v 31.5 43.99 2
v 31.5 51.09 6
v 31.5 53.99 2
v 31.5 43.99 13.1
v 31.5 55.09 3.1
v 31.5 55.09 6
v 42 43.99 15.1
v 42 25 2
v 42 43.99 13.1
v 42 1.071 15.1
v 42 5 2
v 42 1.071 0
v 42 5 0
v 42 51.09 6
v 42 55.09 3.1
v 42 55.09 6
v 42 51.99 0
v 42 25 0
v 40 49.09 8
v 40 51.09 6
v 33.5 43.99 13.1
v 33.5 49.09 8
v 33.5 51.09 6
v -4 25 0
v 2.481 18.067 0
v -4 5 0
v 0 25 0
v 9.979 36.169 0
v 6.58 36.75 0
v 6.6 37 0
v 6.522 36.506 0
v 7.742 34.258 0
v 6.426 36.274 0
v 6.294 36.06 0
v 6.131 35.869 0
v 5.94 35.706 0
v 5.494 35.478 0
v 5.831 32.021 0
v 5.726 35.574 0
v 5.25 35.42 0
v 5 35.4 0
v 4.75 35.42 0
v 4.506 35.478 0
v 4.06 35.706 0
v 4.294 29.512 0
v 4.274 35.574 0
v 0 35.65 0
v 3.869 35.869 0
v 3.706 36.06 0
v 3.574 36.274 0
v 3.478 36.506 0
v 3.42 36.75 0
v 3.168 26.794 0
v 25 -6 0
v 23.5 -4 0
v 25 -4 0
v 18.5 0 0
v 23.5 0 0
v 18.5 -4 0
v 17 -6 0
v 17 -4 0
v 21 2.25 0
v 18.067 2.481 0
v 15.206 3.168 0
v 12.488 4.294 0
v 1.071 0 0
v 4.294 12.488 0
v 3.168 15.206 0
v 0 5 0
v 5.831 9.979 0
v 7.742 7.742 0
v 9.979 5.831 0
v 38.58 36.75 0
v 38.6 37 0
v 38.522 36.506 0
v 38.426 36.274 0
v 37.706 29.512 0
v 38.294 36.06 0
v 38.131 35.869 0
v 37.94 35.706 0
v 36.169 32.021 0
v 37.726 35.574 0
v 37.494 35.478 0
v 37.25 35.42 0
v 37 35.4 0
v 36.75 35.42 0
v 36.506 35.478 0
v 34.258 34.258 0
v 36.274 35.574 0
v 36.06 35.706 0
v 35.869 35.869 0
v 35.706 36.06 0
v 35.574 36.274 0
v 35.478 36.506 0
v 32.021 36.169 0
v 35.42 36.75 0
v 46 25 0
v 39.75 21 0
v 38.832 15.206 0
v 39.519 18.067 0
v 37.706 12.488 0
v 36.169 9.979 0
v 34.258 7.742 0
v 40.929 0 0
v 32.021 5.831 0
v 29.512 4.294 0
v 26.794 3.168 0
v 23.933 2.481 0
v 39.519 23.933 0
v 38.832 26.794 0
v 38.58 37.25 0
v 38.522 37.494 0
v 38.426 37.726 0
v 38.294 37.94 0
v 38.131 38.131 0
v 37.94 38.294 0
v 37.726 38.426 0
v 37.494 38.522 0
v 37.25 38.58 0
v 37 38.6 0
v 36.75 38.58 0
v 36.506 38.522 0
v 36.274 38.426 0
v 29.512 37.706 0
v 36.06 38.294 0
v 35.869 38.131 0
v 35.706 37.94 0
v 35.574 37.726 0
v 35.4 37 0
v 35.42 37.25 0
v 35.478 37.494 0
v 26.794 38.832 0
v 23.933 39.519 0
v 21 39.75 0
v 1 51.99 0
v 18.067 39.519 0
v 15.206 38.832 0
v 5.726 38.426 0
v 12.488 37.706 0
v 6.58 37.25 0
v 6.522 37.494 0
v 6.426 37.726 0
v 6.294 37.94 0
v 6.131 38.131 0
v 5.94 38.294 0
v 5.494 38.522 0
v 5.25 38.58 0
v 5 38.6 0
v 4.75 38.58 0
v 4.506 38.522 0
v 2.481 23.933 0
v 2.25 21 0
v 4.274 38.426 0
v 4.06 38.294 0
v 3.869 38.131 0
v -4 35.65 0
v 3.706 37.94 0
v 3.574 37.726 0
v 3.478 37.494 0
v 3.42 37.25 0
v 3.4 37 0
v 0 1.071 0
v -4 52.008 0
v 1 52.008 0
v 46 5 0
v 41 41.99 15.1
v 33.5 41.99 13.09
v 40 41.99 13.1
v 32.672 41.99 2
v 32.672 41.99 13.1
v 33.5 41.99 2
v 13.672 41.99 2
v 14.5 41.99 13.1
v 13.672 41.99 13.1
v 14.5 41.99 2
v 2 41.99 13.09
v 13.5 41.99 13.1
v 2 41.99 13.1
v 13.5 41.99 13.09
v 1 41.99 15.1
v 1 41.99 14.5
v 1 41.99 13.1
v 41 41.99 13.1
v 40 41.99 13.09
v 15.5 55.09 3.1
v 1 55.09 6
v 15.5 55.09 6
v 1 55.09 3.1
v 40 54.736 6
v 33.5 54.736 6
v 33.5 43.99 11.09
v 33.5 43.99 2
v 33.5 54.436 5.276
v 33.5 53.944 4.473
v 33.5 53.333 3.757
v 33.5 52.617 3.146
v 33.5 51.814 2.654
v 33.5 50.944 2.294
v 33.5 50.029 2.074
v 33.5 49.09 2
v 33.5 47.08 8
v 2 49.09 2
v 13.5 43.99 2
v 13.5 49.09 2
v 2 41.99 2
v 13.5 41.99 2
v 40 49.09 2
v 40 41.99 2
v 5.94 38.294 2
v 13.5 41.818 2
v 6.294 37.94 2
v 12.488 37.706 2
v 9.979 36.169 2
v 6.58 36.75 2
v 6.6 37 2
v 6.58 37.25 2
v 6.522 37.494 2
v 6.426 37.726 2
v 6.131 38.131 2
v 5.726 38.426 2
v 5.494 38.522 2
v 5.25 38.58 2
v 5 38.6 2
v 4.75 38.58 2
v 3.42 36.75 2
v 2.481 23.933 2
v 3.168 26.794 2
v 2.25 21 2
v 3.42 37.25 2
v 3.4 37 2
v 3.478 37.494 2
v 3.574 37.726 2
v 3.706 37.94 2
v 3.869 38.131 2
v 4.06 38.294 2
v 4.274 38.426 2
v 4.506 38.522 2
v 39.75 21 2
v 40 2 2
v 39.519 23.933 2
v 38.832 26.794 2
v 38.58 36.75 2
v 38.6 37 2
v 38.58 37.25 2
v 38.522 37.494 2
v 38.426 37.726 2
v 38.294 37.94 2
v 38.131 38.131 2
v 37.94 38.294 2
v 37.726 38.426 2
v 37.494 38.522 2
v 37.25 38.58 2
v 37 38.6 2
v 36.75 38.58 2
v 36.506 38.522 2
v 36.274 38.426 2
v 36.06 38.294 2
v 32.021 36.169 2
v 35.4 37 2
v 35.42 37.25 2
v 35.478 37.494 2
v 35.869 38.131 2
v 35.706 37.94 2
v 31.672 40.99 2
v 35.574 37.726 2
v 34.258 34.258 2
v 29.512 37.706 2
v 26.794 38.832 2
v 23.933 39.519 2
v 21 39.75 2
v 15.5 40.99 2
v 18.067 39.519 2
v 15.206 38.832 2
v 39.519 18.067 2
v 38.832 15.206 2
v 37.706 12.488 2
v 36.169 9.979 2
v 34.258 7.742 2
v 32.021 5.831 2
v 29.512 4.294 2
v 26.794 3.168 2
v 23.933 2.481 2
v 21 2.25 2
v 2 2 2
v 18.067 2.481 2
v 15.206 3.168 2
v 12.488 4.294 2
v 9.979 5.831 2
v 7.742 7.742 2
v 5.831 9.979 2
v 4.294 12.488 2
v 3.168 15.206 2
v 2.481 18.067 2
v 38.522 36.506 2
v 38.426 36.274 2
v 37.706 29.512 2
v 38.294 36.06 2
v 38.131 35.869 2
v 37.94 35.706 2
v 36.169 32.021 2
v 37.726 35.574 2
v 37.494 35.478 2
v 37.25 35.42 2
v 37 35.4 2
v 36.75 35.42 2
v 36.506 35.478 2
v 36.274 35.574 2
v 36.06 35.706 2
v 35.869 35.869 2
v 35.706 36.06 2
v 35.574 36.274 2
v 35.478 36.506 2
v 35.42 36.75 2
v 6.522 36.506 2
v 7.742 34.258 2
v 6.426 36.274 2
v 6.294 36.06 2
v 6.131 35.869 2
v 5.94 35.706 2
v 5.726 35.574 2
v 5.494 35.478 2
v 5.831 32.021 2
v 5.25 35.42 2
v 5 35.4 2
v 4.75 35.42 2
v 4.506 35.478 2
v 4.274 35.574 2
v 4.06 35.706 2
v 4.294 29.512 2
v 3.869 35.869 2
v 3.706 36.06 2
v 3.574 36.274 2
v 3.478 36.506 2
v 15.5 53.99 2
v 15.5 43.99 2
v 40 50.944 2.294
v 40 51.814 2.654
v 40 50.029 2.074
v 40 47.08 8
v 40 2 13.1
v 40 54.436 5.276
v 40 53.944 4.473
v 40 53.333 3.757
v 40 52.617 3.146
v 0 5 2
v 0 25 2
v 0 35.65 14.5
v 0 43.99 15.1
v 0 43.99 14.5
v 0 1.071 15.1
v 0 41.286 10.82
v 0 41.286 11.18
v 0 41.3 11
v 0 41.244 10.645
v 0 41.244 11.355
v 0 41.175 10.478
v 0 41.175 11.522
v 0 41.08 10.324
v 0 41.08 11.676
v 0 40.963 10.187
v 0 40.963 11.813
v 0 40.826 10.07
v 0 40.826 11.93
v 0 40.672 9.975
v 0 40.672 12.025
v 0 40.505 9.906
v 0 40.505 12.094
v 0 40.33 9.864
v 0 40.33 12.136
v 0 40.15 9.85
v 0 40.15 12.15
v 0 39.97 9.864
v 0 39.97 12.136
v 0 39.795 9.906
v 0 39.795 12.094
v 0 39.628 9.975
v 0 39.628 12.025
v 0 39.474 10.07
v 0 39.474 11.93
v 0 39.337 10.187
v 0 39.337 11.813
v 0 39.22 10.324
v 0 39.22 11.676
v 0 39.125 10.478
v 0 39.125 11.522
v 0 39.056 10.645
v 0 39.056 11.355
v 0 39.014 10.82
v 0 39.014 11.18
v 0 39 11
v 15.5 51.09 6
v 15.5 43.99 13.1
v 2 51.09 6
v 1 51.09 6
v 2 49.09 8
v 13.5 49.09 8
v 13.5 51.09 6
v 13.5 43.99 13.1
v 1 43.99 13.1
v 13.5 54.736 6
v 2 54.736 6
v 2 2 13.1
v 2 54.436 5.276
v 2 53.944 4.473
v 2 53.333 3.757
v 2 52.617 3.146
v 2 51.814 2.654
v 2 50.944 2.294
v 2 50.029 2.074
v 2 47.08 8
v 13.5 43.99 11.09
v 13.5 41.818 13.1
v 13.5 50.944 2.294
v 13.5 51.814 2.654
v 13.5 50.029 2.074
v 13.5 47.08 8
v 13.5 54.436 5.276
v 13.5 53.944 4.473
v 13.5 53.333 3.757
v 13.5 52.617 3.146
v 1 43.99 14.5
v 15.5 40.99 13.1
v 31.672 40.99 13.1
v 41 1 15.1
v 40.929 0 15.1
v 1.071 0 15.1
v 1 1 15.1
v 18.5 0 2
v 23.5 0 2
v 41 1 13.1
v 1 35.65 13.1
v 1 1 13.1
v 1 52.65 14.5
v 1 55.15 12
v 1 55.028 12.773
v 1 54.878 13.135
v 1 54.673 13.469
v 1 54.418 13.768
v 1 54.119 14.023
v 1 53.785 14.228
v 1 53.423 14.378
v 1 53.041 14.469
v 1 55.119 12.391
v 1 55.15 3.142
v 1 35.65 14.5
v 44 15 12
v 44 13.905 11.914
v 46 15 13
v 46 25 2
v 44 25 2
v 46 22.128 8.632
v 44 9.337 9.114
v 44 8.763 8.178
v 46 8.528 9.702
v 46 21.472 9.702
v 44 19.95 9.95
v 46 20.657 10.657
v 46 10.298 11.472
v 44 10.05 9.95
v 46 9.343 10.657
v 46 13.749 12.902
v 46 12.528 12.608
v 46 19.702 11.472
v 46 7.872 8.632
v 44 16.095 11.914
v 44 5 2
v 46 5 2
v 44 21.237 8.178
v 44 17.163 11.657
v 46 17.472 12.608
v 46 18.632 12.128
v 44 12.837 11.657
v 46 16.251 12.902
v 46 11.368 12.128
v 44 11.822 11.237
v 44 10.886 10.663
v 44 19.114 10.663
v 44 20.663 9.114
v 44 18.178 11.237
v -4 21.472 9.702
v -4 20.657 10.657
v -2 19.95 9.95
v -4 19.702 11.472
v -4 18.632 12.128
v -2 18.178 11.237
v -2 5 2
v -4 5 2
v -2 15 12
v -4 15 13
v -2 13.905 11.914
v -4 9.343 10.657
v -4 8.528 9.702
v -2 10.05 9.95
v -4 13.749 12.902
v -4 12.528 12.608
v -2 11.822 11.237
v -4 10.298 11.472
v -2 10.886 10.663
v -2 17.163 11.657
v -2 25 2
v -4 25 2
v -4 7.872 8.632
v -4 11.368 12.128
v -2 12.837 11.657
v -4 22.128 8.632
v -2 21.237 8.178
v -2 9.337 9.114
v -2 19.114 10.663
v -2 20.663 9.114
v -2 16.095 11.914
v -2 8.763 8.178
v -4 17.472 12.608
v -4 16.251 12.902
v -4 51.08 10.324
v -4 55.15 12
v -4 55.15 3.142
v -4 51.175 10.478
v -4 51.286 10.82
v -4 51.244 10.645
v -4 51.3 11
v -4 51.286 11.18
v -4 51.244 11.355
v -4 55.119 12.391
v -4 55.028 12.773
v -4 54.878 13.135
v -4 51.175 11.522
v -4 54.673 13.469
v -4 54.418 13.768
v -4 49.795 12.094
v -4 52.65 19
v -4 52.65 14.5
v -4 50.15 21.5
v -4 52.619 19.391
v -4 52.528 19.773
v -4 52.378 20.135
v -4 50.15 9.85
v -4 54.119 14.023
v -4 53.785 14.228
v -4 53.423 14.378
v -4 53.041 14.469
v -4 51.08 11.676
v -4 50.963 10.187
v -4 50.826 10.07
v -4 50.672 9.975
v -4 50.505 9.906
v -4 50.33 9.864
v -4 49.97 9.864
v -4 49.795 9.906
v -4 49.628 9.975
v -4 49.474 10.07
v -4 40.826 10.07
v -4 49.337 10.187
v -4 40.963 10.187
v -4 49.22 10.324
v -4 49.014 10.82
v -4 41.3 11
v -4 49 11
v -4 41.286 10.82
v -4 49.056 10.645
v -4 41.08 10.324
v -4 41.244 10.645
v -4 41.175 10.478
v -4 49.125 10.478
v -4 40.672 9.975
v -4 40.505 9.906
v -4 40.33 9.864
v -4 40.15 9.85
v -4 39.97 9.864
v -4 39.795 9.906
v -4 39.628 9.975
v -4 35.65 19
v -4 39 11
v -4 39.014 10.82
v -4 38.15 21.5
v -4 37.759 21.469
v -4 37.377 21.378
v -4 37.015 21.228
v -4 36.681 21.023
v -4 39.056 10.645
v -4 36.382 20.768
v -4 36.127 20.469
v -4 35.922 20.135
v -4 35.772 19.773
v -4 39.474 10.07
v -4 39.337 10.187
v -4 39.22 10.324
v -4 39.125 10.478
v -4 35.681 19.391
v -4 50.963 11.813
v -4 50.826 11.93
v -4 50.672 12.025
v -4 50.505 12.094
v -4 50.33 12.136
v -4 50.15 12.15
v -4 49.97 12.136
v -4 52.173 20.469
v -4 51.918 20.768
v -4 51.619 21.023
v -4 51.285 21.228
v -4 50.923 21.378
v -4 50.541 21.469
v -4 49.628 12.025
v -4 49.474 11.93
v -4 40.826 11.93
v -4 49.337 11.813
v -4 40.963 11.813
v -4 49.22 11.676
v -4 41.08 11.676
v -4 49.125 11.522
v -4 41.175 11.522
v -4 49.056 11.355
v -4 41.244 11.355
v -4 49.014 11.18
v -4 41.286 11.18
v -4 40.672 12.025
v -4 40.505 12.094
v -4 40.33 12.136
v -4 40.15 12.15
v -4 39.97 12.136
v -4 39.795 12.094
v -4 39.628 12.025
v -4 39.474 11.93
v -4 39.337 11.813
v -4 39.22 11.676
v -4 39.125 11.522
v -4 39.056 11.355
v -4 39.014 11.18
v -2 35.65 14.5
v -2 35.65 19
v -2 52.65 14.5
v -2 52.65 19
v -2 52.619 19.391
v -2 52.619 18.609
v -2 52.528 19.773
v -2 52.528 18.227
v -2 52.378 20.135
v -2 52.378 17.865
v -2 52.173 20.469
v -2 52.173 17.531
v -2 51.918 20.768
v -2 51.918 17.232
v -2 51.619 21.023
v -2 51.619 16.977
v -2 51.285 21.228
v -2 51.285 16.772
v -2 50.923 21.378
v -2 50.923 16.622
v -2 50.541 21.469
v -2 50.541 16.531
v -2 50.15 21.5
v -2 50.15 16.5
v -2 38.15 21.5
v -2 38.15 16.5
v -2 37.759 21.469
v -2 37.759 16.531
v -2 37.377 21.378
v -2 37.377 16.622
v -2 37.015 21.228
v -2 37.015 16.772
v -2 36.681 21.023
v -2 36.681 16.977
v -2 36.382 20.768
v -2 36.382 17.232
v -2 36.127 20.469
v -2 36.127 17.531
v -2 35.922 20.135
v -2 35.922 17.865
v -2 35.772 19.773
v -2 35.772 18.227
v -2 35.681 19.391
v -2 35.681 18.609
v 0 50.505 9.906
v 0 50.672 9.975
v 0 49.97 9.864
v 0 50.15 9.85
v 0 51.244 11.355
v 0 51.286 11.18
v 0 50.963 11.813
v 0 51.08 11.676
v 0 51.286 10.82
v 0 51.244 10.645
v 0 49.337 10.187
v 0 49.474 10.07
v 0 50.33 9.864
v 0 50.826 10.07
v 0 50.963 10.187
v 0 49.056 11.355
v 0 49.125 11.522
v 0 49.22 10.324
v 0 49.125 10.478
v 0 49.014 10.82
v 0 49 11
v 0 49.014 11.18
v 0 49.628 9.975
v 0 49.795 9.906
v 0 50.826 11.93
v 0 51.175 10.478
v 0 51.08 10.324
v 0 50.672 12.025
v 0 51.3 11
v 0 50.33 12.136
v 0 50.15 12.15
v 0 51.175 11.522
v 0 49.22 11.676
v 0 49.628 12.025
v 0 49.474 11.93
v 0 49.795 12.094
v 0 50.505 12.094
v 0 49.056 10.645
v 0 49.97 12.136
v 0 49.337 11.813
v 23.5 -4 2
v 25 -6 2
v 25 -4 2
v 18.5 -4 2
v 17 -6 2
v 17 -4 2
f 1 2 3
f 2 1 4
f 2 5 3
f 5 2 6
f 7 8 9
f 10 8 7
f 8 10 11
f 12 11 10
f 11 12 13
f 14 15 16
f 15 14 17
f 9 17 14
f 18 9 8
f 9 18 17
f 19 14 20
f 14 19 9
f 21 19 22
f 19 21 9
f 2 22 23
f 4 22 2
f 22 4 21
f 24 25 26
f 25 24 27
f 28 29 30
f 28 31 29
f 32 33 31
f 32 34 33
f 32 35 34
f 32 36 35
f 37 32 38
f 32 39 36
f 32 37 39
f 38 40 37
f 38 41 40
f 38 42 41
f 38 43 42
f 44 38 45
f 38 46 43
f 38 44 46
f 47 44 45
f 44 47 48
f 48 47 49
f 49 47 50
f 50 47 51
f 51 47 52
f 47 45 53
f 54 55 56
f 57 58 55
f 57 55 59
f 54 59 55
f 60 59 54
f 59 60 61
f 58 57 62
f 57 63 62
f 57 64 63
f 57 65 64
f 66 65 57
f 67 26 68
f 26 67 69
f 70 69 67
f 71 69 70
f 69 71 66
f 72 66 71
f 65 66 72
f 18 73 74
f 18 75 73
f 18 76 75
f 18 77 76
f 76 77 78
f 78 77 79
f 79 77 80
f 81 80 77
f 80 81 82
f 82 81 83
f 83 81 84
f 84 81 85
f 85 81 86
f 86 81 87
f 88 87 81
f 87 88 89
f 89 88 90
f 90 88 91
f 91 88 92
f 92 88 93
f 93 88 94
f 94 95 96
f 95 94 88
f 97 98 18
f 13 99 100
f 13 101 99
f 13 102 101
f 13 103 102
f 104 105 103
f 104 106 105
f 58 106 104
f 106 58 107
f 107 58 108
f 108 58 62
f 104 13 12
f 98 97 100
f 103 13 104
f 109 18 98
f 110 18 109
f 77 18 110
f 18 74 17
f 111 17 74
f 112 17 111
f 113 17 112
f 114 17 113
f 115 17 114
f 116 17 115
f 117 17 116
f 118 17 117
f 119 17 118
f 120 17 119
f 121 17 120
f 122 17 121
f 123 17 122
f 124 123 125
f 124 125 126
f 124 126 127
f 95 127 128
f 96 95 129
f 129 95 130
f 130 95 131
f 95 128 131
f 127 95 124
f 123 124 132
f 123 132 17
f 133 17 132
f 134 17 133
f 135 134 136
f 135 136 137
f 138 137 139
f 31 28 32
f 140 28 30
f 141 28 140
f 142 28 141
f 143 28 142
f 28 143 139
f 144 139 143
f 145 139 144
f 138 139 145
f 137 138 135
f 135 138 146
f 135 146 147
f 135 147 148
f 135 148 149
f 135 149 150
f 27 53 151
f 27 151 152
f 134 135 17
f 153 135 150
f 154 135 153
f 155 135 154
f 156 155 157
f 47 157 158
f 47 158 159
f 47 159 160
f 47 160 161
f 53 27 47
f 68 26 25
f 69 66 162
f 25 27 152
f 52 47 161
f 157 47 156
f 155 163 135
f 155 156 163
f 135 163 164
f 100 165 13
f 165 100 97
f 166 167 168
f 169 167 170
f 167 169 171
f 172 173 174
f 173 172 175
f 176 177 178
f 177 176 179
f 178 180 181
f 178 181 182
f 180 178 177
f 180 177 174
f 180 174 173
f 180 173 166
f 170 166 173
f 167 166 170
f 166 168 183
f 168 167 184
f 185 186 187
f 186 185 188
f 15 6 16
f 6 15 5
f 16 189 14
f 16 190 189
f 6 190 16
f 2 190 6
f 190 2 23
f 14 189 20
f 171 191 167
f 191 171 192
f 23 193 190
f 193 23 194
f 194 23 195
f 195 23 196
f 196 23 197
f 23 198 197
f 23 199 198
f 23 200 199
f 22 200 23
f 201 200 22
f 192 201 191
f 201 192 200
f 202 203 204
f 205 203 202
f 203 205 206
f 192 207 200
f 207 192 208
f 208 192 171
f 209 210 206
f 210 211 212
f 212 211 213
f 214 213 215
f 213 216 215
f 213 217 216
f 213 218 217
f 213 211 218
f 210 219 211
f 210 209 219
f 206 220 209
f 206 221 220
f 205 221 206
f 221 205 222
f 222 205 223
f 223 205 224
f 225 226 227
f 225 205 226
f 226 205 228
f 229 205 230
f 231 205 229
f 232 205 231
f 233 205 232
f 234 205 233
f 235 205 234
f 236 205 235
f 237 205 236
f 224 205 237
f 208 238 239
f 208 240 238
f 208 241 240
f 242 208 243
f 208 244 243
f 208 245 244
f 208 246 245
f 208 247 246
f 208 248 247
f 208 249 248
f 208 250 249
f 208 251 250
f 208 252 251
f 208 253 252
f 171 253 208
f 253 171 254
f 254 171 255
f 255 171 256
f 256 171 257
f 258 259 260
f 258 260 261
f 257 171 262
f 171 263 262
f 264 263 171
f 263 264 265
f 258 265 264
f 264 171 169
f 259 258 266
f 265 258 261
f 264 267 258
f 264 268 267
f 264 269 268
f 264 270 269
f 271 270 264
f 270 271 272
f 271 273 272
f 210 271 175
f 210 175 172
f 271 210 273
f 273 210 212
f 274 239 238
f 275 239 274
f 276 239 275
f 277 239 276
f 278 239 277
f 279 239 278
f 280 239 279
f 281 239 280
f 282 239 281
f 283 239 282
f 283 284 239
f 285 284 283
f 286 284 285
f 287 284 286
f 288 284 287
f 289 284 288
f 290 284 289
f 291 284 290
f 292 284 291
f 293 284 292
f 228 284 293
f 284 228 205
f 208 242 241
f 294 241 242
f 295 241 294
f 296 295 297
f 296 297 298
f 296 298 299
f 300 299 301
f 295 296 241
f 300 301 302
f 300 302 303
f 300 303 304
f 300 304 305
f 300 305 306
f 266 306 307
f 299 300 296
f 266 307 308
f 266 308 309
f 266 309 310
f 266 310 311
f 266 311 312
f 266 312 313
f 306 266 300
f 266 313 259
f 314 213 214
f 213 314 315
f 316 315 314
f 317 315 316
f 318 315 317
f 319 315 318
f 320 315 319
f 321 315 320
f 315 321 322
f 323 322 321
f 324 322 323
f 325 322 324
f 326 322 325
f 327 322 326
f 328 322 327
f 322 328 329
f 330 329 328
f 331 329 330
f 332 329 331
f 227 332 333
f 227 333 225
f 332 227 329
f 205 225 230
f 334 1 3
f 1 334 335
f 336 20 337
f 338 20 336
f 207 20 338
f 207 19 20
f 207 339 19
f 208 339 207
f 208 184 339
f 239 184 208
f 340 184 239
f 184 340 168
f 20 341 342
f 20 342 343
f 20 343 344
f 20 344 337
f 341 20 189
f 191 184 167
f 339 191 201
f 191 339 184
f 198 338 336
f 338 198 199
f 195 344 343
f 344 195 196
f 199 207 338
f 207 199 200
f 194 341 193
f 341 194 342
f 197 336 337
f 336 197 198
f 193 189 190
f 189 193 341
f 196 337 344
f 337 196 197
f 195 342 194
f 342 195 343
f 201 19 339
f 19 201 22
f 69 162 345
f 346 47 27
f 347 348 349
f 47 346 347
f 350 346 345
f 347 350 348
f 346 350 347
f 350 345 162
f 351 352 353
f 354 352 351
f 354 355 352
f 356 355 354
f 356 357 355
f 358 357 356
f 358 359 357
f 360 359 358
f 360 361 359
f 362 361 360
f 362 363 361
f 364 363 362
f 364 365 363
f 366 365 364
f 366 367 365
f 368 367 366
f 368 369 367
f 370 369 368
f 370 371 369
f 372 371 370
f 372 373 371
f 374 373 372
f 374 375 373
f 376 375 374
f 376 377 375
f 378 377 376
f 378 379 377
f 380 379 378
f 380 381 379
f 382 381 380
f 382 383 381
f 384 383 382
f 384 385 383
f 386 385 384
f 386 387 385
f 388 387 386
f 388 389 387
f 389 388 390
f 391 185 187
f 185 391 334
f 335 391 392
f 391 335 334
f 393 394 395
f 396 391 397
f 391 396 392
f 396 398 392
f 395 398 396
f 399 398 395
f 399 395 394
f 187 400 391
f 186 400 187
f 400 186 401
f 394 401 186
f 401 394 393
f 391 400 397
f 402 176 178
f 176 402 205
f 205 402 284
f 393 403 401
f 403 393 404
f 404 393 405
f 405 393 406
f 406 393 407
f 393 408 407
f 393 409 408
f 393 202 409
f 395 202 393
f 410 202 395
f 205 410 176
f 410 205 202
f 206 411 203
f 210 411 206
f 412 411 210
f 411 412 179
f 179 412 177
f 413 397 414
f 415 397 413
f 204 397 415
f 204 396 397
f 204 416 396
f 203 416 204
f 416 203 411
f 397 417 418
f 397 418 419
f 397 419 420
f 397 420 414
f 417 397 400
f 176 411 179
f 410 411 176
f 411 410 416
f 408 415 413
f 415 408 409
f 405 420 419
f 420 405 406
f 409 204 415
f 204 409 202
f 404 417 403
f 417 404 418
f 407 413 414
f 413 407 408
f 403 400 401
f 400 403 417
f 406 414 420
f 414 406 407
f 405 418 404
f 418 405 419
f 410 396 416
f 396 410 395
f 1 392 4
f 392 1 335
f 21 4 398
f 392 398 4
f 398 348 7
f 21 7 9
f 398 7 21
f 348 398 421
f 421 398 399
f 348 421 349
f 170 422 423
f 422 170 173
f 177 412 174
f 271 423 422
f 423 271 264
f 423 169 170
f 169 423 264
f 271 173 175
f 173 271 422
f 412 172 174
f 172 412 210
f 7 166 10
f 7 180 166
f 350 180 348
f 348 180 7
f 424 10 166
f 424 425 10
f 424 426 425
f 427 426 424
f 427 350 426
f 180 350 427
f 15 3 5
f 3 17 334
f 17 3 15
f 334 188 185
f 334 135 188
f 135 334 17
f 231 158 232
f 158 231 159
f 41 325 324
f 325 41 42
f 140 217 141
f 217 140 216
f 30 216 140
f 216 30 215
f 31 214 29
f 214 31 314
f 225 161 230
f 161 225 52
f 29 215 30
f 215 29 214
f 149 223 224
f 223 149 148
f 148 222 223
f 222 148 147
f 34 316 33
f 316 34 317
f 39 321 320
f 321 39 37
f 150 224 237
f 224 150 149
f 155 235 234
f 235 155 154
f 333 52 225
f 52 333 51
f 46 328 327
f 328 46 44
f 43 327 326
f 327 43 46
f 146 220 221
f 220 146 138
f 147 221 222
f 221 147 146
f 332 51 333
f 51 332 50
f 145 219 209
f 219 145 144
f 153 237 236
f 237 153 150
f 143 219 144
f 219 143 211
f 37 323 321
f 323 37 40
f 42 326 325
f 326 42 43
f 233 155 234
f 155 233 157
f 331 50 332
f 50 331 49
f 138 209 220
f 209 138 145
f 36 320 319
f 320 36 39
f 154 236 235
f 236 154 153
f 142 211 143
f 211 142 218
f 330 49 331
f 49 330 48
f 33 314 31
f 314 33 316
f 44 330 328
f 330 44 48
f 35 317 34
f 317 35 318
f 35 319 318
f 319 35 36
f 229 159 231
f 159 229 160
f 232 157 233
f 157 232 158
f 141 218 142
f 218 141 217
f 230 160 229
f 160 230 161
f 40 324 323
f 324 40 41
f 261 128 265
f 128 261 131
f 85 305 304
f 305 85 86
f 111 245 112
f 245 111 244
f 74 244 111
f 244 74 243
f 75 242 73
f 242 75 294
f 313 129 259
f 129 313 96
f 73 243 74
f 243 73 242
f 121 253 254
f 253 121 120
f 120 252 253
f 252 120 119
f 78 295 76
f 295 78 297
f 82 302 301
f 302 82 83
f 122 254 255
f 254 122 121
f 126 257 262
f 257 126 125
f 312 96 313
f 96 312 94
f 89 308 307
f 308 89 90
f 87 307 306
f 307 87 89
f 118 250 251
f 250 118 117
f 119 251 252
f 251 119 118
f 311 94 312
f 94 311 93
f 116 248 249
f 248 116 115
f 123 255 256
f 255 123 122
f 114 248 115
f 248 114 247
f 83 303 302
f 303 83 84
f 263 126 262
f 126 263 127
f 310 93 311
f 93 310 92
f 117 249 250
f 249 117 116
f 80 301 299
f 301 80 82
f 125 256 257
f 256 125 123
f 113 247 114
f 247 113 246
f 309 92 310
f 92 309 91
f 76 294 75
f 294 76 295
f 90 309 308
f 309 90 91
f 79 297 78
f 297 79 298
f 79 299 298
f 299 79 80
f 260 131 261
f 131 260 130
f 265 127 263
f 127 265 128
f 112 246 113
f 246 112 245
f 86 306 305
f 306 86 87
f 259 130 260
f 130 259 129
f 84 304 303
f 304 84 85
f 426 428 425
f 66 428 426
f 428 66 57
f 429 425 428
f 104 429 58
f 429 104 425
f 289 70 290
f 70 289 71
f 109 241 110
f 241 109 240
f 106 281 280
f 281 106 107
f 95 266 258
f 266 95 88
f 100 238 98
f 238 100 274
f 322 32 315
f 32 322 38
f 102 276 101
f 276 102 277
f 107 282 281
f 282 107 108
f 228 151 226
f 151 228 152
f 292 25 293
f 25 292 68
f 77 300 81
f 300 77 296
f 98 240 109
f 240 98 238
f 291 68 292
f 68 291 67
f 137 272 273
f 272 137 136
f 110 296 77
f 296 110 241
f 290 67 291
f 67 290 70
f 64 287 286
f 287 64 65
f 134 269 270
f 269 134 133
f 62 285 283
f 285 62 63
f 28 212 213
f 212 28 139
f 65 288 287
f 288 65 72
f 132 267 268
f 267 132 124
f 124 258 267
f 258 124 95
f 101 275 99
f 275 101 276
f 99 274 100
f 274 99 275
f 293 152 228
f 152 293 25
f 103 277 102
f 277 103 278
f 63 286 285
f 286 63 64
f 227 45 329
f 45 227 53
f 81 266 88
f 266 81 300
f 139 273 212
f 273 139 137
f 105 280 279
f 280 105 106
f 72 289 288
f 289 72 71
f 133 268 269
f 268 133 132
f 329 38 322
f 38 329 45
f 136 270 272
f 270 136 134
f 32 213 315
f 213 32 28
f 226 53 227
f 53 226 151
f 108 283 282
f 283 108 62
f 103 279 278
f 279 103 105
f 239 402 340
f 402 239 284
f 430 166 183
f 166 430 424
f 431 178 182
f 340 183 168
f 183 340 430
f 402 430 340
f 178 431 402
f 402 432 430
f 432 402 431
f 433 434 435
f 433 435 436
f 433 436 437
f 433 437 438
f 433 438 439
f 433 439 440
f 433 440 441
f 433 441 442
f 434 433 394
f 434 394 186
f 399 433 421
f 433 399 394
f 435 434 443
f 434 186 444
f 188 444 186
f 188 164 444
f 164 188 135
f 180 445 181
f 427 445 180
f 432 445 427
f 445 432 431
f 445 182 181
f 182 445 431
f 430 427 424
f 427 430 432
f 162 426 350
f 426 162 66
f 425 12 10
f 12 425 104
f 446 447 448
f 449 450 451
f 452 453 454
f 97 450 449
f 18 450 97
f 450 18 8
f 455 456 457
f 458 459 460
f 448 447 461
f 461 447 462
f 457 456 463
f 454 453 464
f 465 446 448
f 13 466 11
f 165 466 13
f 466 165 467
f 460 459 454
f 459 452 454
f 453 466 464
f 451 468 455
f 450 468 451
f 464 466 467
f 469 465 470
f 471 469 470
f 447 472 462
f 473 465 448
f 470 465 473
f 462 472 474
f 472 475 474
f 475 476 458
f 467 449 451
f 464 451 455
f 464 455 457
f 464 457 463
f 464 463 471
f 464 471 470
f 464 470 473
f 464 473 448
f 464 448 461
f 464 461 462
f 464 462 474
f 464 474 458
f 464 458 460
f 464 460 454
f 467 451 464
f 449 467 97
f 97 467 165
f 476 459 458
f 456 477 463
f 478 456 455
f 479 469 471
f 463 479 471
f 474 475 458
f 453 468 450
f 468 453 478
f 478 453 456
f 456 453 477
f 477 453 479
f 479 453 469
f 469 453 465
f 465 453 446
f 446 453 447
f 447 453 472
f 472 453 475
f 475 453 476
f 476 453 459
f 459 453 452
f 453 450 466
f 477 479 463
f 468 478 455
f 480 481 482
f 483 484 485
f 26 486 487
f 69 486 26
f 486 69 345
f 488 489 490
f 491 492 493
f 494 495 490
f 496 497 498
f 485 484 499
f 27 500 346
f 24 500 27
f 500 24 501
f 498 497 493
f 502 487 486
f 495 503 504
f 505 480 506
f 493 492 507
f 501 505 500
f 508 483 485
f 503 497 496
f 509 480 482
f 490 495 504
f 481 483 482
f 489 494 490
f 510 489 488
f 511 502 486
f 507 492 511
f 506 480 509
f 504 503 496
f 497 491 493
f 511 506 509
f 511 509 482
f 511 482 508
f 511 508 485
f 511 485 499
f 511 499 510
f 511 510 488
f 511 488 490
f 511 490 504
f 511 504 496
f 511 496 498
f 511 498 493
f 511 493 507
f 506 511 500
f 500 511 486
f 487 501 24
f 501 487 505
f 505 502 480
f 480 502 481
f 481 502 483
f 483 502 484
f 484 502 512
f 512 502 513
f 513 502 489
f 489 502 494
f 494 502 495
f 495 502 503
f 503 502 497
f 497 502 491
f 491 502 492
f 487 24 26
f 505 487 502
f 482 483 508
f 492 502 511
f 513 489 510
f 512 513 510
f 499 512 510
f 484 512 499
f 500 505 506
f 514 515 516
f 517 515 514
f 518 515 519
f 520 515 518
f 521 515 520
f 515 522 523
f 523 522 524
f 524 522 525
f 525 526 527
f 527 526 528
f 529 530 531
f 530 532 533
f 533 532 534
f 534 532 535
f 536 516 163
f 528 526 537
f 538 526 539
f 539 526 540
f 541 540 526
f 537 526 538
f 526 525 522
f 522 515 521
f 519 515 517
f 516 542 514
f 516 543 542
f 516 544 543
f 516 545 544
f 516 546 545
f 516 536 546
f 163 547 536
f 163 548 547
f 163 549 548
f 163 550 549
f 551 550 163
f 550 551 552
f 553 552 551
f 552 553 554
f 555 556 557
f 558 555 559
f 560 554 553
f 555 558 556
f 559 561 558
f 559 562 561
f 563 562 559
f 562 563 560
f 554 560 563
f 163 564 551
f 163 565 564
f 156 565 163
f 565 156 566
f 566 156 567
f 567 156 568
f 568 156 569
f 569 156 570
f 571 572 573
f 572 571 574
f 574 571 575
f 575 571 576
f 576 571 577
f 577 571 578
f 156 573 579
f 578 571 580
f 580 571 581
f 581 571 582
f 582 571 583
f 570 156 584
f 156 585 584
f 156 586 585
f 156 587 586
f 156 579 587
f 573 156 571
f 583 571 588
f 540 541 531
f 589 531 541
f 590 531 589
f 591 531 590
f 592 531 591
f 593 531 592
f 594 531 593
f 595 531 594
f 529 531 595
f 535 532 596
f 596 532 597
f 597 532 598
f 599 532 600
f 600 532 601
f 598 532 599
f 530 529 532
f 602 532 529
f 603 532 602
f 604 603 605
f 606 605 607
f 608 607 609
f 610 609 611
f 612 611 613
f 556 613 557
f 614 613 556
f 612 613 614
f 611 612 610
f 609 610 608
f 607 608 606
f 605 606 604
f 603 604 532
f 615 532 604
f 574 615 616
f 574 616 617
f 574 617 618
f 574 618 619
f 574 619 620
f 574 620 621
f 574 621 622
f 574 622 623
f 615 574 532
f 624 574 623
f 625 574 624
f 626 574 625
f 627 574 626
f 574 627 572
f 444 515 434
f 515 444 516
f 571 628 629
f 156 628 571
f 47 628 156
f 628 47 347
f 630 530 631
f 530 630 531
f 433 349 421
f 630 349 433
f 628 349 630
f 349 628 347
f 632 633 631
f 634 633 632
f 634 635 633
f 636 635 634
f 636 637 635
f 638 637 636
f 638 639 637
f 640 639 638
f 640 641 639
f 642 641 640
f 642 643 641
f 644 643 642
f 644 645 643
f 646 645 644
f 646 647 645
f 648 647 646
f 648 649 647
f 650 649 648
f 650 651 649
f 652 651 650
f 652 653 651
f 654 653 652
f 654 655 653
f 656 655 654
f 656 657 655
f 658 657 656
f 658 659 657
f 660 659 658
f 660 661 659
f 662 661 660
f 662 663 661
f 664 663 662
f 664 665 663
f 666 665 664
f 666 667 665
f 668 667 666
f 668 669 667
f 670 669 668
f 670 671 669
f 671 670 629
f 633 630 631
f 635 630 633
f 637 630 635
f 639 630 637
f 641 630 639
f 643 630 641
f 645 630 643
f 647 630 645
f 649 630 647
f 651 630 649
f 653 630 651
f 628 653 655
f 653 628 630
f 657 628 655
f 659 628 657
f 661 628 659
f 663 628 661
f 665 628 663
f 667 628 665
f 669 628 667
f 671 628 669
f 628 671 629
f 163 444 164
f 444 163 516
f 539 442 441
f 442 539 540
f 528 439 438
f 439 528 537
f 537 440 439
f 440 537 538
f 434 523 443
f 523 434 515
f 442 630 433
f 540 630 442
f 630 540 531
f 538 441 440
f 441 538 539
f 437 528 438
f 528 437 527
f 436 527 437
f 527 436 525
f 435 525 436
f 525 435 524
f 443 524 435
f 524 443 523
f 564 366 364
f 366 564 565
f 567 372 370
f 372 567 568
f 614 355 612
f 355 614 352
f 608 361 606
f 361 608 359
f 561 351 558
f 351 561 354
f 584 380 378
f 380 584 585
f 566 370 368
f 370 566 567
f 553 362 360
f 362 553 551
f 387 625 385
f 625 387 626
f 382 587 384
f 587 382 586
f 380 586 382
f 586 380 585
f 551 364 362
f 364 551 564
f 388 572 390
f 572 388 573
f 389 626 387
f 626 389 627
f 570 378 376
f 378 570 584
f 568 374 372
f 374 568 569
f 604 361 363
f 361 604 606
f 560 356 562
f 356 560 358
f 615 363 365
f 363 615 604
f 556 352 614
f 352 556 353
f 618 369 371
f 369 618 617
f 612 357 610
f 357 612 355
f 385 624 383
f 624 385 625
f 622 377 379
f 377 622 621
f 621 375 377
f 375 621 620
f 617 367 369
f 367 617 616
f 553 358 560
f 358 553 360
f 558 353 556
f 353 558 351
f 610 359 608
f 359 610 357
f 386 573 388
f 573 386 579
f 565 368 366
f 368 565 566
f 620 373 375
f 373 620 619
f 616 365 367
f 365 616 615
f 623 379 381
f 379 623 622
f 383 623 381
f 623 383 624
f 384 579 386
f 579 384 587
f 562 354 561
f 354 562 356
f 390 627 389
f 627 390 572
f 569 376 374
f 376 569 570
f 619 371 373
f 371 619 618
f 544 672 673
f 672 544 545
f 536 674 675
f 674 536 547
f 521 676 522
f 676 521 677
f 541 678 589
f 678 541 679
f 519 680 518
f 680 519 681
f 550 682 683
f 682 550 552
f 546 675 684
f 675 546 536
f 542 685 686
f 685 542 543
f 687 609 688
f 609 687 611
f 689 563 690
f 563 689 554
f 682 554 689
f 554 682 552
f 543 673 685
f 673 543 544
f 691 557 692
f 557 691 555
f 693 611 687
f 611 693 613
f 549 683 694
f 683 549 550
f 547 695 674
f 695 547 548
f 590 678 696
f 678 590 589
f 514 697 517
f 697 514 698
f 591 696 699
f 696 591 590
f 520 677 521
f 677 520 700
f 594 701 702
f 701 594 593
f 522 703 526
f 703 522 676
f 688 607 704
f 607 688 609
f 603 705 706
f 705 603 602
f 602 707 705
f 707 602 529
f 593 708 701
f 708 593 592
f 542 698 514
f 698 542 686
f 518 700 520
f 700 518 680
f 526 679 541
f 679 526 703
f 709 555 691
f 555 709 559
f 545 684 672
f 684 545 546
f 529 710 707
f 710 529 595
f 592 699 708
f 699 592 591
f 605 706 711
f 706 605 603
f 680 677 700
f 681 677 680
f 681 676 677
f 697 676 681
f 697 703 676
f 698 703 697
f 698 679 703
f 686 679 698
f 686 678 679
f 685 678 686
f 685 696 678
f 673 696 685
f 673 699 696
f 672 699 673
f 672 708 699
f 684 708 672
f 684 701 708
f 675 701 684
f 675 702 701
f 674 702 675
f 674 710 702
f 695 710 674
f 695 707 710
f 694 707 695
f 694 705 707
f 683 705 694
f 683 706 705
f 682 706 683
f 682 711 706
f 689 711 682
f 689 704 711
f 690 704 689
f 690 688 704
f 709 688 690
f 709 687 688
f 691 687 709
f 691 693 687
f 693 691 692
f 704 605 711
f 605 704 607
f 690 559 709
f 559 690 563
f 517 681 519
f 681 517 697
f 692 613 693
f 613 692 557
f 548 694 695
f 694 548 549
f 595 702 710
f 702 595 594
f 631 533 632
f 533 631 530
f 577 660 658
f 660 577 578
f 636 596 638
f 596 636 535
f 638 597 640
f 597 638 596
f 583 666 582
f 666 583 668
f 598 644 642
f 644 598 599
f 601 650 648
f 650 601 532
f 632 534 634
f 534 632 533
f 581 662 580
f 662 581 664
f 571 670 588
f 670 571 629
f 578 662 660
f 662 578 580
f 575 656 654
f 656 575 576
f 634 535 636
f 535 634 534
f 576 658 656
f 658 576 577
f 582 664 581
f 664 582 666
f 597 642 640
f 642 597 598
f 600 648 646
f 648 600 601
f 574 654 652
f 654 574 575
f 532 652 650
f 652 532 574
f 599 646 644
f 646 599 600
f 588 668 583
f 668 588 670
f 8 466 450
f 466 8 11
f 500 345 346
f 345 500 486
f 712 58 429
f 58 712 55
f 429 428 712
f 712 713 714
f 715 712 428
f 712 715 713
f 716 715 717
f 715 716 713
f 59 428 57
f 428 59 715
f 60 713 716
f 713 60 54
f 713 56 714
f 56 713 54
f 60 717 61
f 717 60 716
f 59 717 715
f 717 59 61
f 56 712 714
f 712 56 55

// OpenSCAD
$fn=40;
//hotend duct 
sc = 32; //Screw Centres
wall=2;
hole = 37.5;  //fan hole
x=42;
y=x;
z=15.10;
heo = 2.5; //hot end offset
hbr = 16; //heat block recess

ventB=(x/2)-(hbr/2)+heo;
ventS=(x/2)-(hbr/2)-heo;

module prism(l, w, h) {
	translate([0, l, 0]) rotate( a= [90, 0, 0]) 
	linear_extrude(height = l) polygon(points = [
		[0, 0],
		[w, 0],
		[0, h]
	], paths=[[0,2,1]]);
}

module vHole(len) {
	difference() {
		union() {
			cube([10-6,len,6]);
			translate([10-6,len,6]) rotate([90,0,0]) cylinder(len,6,6);
		}
		translate ([-7,-1,6]) cube([16,len+2,10]);
		translate ([-7,-1,0]) cube([6,len+2,7]);
	}
}

module irsensor_mount() {
	difference() {
		union() {
		difference() {
			cube([5,19.5,19]); //main block
			translate([-1,17,12]) cube([7,3.5,8]); //end gap
			translate([2,-1,14.5]) cube([4,19.5,8]); //back gap
			translate([-2,20.5,-10]) rotate([45,0,0]) cube(10); //match vent bevel
		}
		translate([0,17,12]) rotate([0,90,0]) cylinder(5,2.5,2.5); //rounded end
		}
		translate([-1,4.5,11]) rotate([0,90,0]) cylinder(5,1.15,1.15); //screw hole L
		translate([-1,14.5,11]) rotate([0,90,0]) cylinder(5,1.15,1.15); //screw hole R
	}
	
	hull() { //rounded top
		translate([0,2.5,19]) rotate([0,90,0]) cylinder(2,2.5,2.5);
		translate([0,14.5,19]) rotate([0,90,0]) cylinder(2,2.5,2.5);
	}
}

//Vents
translate([x,y-0.01,0]) rotate([0,0,90]) {
difference() {
	union() {
	difference() {
		union() {
			prism(ventS,z,z);
			translate([z-6,0,0]) cube([4,ventS,6]);
		}
		difference() {
			translate([-.01,wall,wall]) prism(ventS-(wall*2),z-(wall*2),z-(wall*2));
			translate([6,0,0]) cube([6,ventS,6]);
		}
		
		translate([z-12,wall,wall]) vHole(ventS-(wall*2));
	}

	translate([0,ventS+hbr,0]) { //Small Vent
		difference() { //Big Vent
			union() {
				prism(ventB,z,z);
				translate([z-6,0,0]) cube([4,ventB,6]);
			}
			difference() {
				translate([-.01,wall,wall]) prism(ventB-(wall*2),z-(wall*2),z-(wall*2));
				translate([6,0,0]) cube([6,ventB,6]);
			}
			translate([z-12,wall,wall]) vHole(ventB-(wall*2));
		}
	}
	cube([z-2,y,wall]); //Base
	translate([0,0,z-wall]) cube([wall,y,wall]); //top of slope edging strip
	difference() {
		translate([-wall/2,ventS-wall,wall]) cube([wall+1,hbr+(wall*2),z-(wall*2)]); //vent join

		translate([-1,ventS-3,wall]) rotate([0,0,45]) cube([wall,wall,z-(wall*2)]); //vent join bevel
		translate([-1,hbr+ventS,wall]) rotate([0,0,45]) cube([wall,wall,z-(wall*2)]); //vent join bevel
	}
	}
	translate([10,-1,0]) rotate([0,45,0]) cube([10,y+2,10]); //vent bevel
}

}

//Body
difference() {
	cube([x,y,z]); //outer block
	translate([x/2,x/2,-.1]) cylinder(20,hole/2,hole/2); //fan hole
	translate([wall,wall,2]) cube([x-(wall*2), x, 20]); //heatsink hole
	translate([wall-1,wall-1,z-2]) cube([x-(wall), x, 20]); //heatsink recess
	
	for(xp = [0:1]) { //4 x screw holes
		for(yp = [1:1]) { // dont need 4 screw holes so changed [0:1] to [1:1]
			//hull() { //hull to make slots
			translate([((x-sc)/2) + (xp*sc),((x-sc)/2) + (yp*sc),-.1]) cylinder(3,1.6,1.6);
			//translate([((x-sc)/2) + (xp*sc),((x-sc)/2) + (yp*sc)+2,-.1]) cylinder(3,1.5,1.5);
			//}
		}
	}
	translate([0,-6,-1]) rotate([0,0,45]) cube([5,5,z+2]);
	translate([x,-6,-1]) rotate([0,0,45]) cube([5,5,z+2]);
}


//Cable Traps
translate([x,5,0]) cube([wall*2,20,2]); //right cable trap
	difference() {
	hull() {
		translate([x+wall,5+10,5]) rotate([0,90,0]) cylinder(wall,7,8); //right cable trap
		translate([x+wall,5,0]) cube([wall,20,2]); //right cable trap
	}
	translate([x+wall-.1,5,-10]) cube([wall+.2,20,10]); //remove bottom cylinder
}

translate([-wall*2,5,0]) cube([wall*2,20,2]); //left cable trap
	difference() {
	hull() {
		translate([-wall*2,5+10,5]) rotate([0,90,0]) cylinder(wall,8,7); 
		translate([-wall*2,5,0]) cube([wall,20,2]); 
	}
	translate([-(wall*2)-.1,5,-10]) cube([wall+.2,20,10]); //remove bottom cylinder
}

//Tie Wrap T
translate([x/2-2.5,-6,0]) cube([5,6,2]);
translate([x/2-4,-6,0]) cube([8,2,2]);

translate([-4,35.65,0]) irsensor_mount();
